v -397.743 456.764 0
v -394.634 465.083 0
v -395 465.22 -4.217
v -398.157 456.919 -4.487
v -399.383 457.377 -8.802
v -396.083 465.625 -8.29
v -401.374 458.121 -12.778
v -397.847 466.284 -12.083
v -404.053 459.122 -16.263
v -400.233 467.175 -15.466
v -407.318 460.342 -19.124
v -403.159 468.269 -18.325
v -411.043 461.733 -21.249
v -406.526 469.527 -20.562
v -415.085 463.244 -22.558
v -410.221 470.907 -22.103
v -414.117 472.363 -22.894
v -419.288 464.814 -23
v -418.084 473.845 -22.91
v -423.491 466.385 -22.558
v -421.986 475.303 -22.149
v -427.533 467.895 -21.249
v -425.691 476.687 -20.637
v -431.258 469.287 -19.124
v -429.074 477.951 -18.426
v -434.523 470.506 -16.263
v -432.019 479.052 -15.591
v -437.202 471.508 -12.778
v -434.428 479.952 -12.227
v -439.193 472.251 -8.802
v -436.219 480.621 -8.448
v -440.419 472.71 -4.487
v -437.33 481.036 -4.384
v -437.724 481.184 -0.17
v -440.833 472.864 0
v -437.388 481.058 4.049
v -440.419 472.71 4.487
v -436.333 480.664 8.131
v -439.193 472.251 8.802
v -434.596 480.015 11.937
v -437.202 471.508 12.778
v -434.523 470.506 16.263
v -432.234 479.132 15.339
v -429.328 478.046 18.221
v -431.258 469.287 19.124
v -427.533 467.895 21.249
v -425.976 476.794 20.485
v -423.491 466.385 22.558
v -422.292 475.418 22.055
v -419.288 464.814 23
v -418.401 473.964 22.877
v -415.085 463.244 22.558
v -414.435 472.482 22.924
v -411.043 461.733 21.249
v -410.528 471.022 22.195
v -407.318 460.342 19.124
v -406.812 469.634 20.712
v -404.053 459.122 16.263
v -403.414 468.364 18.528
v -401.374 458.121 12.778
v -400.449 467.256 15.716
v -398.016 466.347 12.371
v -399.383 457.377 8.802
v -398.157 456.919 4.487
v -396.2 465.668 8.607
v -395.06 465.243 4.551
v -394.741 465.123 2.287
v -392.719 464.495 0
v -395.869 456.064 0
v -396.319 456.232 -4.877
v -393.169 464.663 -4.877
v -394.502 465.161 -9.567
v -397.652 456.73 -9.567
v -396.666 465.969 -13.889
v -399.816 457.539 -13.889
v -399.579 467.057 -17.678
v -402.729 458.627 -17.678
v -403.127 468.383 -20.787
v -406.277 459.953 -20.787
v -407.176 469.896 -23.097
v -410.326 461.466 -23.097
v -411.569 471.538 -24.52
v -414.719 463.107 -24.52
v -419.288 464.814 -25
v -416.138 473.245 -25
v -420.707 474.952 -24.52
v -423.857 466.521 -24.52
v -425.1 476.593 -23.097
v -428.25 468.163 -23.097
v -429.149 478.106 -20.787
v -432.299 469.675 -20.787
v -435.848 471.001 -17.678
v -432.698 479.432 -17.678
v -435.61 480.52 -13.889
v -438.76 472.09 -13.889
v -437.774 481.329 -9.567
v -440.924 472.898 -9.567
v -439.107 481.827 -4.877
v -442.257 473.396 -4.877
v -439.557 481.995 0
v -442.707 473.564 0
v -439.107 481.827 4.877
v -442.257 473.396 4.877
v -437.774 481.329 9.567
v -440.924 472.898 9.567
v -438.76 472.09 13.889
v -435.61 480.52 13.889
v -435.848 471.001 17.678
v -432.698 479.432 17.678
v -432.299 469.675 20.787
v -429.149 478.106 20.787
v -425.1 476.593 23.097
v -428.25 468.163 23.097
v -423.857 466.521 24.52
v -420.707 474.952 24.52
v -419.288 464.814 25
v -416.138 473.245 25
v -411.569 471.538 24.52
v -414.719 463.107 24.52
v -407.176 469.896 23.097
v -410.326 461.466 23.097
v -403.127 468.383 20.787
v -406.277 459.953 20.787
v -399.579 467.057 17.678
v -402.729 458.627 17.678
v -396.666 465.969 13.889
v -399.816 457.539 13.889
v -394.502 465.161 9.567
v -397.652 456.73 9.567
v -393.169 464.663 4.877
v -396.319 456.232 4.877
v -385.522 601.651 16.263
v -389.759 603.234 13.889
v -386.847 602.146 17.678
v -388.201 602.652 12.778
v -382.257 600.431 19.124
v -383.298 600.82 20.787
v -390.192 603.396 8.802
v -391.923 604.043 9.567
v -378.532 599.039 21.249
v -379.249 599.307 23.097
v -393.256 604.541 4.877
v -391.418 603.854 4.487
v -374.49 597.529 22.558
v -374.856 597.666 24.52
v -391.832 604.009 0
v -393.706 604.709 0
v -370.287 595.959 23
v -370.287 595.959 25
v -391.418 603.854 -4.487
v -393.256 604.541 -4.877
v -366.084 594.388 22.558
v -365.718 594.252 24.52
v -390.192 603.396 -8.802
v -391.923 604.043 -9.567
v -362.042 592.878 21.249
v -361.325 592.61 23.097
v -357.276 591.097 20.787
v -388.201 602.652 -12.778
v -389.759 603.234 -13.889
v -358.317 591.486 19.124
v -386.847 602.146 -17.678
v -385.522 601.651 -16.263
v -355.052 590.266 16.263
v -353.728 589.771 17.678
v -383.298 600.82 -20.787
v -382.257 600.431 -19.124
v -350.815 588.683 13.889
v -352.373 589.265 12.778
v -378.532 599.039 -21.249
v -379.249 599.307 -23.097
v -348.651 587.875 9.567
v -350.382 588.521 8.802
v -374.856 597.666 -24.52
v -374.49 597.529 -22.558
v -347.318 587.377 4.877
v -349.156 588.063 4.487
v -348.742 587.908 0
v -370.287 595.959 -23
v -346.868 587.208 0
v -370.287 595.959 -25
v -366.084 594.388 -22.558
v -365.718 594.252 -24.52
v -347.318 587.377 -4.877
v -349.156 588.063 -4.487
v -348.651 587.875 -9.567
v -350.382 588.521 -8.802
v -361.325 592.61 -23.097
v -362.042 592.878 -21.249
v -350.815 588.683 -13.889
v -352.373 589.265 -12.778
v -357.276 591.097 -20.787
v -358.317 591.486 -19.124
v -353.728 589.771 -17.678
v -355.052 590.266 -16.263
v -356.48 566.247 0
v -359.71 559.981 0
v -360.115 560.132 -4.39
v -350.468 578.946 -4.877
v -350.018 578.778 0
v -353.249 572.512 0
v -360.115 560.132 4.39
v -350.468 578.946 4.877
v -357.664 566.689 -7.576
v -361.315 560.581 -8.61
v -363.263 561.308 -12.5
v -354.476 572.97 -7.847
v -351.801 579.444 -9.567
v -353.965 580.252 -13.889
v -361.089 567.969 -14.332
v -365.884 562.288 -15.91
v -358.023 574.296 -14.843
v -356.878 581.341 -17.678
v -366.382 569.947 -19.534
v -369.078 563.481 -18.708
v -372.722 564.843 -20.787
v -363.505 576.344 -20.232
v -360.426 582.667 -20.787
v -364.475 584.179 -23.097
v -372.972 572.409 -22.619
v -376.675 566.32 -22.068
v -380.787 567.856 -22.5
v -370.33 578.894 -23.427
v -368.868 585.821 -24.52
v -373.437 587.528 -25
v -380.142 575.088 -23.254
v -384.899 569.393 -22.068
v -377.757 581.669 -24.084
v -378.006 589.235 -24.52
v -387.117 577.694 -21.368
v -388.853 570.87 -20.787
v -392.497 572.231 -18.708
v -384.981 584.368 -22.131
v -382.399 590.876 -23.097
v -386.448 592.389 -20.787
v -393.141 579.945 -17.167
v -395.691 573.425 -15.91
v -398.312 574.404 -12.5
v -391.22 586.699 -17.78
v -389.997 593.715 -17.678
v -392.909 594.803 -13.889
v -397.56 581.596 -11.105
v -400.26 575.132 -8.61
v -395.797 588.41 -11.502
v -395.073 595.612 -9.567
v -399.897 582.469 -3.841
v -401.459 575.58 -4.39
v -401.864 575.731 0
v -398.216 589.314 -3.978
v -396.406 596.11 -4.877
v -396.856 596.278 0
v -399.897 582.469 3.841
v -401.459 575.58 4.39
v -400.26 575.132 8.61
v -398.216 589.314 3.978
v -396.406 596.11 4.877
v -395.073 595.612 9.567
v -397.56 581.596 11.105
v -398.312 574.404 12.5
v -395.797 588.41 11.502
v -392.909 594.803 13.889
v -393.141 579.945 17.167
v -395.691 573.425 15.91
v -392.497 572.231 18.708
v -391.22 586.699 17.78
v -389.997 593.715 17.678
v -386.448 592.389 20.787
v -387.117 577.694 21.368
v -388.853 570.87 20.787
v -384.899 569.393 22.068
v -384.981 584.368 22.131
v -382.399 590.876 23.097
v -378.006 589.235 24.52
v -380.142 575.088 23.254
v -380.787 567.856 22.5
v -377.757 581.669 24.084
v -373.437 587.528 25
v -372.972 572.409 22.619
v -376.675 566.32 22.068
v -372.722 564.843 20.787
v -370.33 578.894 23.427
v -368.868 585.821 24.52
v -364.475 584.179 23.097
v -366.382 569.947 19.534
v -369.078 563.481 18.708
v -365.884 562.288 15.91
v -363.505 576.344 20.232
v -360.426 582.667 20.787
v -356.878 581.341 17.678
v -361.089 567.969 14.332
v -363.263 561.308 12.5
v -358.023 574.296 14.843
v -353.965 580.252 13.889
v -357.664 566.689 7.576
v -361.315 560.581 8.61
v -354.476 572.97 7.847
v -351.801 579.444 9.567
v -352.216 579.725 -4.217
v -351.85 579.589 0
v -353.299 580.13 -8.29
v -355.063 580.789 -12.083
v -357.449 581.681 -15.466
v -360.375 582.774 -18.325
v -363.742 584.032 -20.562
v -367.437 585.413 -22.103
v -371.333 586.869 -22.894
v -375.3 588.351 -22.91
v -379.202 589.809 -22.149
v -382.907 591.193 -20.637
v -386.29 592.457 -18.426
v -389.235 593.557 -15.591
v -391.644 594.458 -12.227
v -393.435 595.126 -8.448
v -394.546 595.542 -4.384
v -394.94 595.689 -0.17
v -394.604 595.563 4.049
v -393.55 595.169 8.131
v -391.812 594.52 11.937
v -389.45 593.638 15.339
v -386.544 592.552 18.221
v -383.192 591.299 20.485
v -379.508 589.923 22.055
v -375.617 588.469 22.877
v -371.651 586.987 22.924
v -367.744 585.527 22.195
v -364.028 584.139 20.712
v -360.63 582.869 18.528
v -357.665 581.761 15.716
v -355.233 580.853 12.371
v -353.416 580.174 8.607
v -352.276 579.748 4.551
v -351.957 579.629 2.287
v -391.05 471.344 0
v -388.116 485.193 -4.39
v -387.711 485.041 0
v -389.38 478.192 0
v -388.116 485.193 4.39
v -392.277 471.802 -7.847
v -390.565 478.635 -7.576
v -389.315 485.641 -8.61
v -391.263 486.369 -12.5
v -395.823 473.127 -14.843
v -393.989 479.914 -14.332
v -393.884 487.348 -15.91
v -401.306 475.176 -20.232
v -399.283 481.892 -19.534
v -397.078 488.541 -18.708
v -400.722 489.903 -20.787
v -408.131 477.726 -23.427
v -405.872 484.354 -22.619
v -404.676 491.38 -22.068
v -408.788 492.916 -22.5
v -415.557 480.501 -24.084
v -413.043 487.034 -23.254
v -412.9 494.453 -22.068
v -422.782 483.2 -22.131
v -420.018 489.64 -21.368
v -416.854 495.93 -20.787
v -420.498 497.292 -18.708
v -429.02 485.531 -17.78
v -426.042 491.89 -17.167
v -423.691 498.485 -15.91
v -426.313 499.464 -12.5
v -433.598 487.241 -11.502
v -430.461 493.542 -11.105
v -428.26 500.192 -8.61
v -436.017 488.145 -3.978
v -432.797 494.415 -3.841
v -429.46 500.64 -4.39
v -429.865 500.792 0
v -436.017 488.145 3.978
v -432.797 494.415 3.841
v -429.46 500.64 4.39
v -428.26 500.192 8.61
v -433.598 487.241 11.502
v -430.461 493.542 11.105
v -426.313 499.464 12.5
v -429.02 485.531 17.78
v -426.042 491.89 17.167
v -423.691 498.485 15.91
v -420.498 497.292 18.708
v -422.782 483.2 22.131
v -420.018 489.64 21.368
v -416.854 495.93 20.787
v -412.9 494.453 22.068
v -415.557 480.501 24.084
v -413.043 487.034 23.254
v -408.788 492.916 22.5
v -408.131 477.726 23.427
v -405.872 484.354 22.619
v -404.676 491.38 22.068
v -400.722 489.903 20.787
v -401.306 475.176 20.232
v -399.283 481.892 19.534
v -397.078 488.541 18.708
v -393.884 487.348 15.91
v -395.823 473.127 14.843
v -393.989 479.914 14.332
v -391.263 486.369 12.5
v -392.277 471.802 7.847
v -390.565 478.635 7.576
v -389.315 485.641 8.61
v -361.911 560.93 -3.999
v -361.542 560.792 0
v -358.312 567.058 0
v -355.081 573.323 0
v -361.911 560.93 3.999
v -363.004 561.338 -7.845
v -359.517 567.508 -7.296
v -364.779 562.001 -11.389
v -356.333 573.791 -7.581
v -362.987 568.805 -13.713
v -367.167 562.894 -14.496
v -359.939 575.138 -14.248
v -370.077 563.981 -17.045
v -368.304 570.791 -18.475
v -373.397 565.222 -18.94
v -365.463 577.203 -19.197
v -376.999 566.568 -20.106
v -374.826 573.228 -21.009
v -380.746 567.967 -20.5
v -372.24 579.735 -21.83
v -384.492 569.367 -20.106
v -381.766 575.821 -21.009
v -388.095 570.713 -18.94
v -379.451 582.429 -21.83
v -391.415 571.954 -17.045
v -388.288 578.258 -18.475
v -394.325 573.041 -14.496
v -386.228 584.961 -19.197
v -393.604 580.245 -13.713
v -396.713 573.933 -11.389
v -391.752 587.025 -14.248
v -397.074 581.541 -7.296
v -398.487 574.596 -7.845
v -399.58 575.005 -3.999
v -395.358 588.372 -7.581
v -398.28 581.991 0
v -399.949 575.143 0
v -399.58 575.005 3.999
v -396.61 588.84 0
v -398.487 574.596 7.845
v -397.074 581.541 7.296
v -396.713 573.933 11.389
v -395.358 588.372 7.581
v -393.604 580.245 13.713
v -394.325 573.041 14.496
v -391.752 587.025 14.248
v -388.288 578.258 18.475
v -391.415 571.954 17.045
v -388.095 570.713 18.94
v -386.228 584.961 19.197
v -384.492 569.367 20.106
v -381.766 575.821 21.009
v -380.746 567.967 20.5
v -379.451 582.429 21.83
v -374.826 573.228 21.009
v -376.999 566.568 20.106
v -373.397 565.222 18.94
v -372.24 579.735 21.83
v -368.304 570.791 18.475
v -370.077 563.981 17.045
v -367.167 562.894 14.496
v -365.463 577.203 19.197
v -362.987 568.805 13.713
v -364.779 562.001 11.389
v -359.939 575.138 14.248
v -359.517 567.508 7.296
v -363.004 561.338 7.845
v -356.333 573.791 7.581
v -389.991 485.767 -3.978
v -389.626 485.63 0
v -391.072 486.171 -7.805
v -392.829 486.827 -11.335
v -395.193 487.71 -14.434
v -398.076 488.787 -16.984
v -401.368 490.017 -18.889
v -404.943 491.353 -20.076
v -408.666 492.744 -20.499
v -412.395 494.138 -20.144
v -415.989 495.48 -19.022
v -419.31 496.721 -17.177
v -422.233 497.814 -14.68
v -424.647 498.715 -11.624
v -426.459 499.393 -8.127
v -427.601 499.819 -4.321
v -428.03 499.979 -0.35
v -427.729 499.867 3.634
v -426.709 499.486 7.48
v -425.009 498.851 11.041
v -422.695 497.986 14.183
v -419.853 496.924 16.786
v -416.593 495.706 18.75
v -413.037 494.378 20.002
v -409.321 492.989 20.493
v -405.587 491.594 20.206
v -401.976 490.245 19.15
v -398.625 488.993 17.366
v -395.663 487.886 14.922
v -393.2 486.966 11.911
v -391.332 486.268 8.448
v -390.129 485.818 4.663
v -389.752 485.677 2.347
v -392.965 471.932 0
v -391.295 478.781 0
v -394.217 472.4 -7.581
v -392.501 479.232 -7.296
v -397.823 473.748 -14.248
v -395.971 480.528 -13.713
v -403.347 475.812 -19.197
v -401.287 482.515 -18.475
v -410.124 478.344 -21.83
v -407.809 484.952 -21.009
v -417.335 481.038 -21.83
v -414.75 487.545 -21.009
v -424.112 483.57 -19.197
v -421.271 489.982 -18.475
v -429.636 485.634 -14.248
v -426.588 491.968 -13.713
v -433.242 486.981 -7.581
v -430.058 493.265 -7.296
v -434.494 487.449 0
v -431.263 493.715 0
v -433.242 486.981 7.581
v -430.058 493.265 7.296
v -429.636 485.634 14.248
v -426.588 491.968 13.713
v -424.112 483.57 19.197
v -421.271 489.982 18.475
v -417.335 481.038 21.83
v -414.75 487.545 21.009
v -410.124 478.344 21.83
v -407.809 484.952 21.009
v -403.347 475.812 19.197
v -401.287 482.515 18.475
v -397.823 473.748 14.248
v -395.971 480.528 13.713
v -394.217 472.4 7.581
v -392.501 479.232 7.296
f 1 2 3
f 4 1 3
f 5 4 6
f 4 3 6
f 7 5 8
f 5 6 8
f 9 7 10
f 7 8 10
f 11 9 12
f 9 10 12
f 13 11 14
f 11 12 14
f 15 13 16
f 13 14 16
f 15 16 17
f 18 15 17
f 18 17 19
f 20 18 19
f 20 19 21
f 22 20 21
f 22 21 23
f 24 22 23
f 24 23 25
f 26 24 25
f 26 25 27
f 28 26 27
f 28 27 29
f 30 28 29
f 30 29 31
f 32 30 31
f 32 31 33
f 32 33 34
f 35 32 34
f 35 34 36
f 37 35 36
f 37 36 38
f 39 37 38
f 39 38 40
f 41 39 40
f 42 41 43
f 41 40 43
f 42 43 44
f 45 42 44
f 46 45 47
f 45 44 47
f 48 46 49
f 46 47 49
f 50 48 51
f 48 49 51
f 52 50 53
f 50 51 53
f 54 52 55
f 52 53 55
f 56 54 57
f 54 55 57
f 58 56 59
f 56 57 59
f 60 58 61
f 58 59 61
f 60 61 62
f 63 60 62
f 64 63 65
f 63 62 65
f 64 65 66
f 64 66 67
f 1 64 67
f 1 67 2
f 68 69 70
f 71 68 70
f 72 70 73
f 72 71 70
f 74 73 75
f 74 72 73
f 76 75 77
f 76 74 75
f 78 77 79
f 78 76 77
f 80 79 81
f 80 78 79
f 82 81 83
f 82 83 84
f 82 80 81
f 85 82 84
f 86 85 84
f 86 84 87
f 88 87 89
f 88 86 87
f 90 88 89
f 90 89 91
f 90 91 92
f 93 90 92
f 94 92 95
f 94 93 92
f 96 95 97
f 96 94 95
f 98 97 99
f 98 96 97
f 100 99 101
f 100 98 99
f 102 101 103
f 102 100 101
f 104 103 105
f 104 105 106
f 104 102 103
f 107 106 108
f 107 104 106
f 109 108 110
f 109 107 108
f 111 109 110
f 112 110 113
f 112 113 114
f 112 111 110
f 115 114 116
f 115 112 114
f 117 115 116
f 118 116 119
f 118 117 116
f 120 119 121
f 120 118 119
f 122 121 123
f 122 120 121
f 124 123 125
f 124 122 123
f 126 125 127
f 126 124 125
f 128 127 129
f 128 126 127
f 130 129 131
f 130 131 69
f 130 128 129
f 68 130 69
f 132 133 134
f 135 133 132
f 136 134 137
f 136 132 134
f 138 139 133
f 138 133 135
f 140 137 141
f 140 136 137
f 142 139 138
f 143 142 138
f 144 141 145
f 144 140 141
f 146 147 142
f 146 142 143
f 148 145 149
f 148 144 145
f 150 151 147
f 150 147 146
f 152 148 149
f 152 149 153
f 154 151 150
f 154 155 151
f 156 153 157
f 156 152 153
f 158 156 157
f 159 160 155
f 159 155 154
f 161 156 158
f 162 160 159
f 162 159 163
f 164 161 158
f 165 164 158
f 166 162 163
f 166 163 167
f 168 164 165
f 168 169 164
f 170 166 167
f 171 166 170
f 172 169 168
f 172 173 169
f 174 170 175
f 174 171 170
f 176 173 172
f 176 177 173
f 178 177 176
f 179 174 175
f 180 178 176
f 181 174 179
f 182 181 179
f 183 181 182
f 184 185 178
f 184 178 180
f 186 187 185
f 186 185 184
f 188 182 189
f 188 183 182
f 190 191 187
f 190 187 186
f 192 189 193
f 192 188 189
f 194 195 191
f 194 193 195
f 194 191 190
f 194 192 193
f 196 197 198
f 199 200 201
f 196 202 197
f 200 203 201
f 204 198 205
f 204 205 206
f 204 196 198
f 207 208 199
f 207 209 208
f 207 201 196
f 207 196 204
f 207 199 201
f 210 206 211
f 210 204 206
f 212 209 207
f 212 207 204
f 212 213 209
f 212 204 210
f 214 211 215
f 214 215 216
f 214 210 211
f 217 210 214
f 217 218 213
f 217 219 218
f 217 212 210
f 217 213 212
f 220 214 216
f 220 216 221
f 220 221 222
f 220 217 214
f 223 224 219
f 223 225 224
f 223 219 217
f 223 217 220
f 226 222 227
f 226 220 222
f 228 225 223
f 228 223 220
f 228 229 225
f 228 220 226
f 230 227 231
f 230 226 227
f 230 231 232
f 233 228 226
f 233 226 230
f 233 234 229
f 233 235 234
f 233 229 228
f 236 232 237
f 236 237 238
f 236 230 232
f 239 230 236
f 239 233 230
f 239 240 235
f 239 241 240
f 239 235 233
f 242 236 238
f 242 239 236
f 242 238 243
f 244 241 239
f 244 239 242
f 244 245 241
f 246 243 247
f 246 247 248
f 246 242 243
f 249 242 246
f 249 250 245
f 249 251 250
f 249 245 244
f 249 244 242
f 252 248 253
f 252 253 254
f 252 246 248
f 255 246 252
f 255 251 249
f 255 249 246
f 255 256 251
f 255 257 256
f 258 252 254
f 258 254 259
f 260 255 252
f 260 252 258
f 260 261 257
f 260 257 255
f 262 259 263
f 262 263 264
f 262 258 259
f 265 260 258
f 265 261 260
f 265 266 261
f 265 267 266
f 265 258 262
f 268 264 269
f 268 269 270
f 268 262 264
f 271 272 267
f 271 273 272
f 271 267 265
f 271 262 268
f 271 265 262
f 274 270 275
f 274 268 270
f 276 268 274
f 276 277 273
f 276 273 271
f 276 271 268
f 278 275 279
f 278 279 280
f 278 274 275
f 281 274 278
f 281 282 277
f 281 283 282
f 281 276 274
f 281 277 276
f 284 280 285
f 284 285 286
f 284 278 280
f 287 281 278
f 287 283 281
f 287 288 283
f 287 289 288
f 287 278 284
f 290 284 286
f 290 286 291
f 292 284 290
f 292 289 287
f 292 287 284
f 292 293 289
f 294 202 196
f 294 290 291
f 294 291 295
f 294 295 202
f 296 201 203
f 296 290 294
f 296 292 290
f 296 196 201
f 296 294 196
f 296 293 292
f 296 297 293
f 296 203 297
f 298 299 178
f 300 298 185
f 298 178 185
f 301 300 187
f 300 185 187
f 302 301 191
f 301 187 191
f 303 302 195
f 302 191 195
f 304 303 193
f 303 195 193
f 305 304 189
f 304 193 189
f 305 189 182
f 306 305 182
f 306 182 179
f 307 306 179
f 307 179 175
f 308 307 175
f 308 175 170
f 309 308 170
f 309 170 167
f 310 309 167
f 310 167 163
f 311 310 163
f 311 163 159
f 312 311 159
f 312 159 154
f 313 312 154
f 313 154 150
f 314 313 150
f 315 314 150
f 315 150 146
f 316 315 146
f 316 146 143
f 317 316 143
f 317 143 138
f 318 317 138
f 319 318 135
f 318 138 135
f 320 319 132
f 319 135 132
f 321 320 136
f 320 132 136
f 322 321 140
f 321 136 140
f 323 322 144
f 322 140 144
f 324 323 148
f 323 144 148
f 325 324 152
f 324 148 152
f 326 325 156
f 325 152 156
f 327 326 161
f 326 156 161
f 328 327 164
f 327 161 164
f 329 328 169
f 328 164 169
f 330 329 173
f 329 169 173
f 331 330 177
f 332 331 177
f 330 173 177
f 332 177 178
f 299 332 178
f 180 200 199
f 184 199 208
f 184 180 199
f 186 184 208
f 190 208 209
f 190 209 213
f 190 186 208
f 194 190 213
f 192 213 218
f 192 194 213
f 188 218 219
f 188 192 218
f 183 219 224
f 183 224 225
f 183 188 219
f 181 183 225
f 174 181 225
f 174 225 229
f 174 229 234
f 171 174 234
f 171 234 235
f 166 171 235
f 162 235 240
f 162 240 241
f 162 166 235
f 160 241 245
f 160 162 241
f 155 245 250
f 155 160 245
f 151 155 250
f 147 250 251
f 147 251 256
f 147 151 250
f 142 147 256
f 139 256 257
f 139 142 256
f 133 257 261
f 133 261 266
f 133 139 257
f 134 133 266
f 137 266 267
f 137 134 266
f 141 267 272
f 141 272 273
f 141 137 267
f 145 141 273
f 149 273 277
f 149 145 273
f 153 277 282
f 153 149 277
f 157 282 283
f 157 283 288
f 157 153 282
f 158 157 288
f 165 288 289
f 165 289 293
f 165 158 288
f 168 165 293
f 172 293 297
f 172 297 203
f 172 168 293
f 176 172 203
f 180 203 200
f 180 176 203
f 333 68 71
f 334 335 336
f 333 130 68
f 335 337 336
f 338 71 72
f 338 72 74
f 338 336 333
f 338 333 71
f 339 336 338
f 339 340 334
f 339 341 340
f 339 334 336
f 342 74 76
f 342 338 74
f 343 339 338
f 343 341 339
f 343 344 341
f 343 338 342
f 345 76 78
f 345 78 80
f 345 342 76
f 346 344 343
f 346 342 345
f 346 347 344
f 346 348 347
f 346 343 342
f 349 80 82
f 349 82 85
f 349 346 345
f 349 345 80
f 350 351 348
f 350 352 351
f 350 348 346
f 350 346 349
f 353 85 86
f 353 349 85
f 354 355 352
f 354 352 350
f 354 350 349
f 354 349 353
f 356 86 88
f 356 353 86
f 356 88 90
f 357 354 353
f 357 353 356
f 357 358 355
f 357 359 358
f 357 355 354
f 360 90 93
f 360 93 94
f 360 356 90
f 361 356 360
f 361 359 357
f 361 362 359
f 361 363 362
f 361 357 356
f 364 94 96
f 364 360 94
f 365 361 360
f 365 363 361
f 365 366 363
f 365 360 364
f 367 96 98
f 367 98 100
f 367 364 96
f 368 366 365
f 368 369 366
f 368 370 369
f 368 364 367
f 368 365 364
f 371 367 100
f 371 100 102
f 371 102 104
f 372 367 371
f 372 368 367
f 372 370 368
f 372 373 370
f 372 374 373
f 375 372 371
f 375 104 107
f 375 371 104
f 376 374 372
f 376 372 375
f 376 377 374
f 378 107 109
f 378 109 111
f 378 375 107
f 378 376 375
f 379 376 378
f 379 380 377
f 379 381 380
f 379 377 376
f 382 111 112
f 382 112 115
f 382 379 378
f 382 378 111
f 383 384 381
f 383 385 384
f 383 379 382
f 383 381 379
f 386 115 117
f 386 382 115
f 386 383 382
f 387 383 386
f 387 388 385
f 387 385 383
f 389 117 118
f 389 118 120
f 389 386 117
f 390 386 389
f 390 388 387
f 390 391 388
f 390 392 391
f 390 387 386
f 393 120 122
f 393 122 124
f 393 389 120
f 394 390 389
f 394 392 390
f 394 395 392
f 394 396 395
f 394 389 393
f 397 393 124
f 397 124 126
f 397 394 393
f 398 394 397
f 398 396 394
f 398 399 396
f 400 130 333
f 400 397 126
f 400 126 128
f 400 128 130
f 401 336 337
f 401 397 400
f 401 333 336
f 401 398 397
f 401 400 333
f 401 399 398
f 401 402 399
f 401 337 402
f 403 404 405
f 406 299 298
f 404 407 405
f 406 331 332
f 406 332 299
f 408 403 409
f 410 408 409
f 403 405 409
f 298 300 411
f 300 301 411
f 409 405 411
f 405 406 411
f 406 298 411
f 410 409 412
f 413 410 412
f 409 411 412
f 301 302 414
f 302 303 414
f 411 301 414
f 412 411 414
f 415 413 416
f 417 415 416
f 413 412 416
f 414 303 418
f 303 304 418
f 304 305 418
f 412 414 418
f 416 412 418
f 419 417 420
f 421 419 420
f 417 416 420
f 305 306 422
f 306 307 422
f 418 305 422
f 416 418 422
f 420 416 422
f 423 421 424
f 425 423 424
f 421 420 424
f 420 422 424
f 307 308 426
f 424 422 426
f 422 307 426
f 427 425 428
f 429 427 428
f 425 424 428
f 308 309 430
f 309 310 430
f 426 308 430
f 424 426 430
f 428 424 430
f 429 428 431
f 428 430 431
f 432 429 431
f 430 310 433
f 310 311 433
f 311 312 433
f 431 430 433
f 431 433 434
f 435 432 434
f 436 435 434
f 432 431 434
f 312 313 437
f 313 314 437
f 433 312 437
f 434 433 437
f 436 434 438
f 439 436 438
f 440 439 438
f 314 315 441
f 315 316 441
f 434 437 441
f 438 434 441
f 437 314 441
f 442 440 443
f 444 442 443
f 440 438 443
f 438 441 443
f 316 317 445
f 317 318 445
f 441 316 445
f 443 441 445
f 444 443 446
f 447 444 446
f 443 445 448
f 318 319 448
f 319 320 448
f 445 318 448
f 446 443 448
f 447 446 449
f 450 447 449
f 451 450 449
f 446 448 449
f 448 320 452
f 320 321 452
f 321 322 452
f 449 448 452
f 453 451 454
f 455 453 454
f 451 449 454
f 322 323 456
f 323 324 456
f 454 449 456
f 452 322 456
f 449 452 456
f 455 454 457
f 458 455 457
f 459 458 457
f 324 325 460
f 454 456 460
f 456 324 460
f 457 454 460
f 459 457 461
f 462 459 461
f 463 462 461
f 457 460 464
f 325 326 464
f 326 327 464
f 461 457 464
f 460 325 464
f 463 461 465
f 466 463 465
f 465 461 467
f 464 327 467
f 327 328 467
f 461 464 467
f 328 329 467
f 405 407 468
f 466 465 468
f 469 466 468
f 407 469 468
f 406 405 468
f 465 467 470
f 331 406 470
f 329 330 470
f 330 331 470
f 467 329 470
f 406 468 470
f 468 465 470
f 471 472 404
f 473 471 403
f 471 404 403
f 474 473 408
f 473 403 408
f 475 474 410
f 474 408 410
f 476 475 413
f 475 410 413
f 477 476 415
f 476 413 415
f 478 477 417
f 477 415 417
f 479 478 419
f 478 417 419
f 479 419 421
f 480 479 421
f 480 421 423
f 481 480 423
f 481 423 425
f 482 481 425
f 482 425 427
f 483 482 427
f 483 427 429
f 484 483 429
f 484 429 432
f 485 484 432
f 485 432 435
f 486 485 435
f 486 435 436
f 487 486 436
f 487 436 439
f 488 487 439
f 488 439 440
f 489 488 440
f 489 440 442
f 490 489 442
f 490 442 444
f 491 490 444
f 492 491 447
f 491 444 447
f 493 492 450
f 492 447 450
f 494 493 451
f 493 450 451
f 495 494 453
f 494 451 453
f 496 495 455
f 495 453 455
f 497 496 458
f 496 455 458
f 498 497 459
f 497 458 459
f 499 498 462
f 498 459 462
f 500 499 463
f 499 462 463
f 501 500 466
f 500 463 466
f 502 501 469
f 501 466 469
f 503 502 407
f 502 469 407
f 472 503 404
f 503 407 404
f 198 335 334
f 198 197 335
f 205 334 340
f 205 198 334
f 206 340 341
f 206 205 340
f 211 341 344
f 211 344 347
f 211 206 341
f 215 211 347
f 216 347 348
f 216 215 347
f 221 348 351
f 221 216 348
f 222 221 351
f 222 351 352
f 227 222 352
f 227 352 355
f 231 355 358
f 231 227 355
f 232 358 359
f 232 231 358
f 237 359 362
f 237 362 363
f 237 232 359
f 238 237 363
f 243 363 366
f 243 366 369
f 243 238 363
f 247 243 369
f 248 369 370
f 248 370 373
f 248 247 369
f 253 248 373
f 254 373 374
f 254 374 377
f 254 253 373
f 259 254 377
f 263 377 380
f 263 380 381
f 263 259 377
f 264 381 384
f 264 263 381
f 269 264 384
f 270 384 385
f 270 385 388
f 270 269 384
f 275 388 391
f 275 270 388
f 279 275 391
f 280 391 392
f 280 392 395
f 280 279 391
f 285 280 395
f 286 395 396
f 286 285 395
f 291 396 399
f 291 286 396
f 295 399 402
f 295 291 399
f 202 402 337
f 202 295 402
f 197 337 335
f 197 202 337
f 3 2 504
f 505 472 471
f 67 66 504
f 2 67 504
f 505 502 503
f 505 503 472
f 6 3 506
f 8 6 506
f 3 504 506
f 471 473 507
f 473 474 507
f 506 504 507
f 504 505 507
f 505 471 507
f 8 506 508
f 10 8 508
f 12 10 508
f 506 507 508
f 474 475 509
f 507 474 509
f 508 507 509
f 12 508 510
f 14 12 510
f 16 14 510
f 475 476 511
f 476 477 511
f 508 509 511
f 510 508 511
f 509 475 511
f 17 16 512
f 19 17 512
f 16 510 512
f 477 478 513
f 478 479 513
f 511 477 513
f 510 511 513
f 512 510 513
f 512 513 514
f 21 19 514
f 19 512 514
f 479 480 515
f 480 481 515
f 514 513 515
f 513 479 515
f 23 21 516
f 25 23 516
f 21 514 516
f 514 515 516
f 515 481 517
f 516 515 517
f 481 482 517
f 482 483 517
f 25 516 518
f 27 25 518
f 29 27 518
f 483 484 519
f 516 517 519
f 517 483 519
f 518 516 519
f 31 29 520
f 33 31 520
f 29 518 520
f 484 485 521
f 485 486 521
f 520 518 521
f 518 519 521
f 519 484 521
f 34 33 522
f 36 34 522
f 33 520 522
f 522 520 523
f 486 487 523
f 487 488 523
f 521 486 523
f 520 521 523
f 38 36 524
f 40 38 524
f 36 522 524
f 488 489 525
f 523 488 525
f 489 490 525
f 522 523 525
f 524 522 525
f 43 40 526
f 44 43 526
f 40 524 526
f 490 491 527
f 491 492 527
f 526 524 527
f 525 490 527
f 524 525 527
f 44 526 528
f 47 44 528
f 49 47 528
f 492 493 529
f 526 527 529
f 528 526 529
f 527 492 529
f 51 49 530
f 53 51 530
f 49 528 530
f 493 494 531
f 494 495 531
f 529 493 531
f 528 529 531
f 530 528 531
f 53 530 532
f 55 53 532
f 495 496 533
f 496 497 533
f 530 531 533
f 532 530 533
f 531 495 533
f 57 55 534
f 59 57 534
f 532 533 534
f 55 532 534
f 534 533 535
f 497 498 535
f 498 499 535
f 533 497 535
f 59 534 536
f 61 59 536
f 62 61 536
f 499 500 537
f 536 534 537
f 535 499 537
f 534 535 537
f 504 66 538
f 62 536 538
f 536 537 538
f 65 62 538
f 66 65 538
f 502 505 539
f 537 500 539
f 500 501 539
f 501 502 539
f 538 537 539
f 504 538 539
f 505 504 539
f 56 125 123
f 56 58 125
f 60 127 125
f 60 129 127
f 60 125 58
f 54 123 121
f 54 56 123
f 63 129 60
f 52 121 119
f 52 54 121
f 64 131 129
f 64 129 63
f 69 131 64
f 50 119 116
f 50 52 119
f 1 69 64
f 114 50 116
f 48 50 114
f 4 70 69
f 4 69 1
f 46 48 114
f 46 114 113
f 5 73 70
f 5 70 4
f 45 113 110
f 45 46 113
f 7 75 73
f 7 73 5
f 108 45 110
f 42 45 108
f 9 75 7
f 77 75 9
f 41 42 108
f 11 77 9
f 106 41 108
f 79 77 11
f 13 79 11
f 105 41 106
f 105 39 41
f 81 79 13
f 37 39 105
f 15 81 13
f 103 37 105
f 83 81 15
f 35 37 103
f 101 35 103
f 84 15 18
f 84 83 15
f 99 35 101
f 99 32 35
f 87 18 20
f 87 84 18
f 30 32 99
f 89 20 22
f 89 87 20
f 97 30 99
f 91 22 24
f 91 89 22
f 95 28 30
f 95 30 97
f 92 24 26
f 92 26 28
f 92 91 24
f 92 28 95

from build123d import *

# Parameters (mm, degrees)
COQUE1_T = -2


with BuildPart() as part:
    # Esquisse2 → Révolution1 (revolve)
    with BuildSketch(Plane.XY, mode=Mode.PRIVATE) as r_volution1_sk:
        Polygon((-393.705721225, 604.708824353), (-370.2870475, 595.9586403), (-419.288078193, 464.814067439), (-442.706751918, 473.564251491), (-439.55668566, 481.994974032), (-429.864663683, 500.791641556), (-401.864074716, 575.731397477), (-396.855787484, 596.278101812), align=None)
    revolve(r_volution1_sk.sketch.rotate(Axis((-437.599068934, 415.807199106, 0), (0.350007362, 0.936746949, 0)), 180), axis=Axis((-437.599068934, 415.807199106, 0), (0.350007362, 0.936746949, 0)))  # turned: the seam where the file's is

    # Coque1
    coque1_openings = [part.faces().sort_by_distance(p)[0] for p in [
        (-370.2870475, 595.9586403, 0),
        (-419.288078193, 464.814067439, 0),
    ]]
    offset(amount=COQUE1_T, openings=coque1_openings, kind=Kind.INTERSECTION)


solid = part.part
